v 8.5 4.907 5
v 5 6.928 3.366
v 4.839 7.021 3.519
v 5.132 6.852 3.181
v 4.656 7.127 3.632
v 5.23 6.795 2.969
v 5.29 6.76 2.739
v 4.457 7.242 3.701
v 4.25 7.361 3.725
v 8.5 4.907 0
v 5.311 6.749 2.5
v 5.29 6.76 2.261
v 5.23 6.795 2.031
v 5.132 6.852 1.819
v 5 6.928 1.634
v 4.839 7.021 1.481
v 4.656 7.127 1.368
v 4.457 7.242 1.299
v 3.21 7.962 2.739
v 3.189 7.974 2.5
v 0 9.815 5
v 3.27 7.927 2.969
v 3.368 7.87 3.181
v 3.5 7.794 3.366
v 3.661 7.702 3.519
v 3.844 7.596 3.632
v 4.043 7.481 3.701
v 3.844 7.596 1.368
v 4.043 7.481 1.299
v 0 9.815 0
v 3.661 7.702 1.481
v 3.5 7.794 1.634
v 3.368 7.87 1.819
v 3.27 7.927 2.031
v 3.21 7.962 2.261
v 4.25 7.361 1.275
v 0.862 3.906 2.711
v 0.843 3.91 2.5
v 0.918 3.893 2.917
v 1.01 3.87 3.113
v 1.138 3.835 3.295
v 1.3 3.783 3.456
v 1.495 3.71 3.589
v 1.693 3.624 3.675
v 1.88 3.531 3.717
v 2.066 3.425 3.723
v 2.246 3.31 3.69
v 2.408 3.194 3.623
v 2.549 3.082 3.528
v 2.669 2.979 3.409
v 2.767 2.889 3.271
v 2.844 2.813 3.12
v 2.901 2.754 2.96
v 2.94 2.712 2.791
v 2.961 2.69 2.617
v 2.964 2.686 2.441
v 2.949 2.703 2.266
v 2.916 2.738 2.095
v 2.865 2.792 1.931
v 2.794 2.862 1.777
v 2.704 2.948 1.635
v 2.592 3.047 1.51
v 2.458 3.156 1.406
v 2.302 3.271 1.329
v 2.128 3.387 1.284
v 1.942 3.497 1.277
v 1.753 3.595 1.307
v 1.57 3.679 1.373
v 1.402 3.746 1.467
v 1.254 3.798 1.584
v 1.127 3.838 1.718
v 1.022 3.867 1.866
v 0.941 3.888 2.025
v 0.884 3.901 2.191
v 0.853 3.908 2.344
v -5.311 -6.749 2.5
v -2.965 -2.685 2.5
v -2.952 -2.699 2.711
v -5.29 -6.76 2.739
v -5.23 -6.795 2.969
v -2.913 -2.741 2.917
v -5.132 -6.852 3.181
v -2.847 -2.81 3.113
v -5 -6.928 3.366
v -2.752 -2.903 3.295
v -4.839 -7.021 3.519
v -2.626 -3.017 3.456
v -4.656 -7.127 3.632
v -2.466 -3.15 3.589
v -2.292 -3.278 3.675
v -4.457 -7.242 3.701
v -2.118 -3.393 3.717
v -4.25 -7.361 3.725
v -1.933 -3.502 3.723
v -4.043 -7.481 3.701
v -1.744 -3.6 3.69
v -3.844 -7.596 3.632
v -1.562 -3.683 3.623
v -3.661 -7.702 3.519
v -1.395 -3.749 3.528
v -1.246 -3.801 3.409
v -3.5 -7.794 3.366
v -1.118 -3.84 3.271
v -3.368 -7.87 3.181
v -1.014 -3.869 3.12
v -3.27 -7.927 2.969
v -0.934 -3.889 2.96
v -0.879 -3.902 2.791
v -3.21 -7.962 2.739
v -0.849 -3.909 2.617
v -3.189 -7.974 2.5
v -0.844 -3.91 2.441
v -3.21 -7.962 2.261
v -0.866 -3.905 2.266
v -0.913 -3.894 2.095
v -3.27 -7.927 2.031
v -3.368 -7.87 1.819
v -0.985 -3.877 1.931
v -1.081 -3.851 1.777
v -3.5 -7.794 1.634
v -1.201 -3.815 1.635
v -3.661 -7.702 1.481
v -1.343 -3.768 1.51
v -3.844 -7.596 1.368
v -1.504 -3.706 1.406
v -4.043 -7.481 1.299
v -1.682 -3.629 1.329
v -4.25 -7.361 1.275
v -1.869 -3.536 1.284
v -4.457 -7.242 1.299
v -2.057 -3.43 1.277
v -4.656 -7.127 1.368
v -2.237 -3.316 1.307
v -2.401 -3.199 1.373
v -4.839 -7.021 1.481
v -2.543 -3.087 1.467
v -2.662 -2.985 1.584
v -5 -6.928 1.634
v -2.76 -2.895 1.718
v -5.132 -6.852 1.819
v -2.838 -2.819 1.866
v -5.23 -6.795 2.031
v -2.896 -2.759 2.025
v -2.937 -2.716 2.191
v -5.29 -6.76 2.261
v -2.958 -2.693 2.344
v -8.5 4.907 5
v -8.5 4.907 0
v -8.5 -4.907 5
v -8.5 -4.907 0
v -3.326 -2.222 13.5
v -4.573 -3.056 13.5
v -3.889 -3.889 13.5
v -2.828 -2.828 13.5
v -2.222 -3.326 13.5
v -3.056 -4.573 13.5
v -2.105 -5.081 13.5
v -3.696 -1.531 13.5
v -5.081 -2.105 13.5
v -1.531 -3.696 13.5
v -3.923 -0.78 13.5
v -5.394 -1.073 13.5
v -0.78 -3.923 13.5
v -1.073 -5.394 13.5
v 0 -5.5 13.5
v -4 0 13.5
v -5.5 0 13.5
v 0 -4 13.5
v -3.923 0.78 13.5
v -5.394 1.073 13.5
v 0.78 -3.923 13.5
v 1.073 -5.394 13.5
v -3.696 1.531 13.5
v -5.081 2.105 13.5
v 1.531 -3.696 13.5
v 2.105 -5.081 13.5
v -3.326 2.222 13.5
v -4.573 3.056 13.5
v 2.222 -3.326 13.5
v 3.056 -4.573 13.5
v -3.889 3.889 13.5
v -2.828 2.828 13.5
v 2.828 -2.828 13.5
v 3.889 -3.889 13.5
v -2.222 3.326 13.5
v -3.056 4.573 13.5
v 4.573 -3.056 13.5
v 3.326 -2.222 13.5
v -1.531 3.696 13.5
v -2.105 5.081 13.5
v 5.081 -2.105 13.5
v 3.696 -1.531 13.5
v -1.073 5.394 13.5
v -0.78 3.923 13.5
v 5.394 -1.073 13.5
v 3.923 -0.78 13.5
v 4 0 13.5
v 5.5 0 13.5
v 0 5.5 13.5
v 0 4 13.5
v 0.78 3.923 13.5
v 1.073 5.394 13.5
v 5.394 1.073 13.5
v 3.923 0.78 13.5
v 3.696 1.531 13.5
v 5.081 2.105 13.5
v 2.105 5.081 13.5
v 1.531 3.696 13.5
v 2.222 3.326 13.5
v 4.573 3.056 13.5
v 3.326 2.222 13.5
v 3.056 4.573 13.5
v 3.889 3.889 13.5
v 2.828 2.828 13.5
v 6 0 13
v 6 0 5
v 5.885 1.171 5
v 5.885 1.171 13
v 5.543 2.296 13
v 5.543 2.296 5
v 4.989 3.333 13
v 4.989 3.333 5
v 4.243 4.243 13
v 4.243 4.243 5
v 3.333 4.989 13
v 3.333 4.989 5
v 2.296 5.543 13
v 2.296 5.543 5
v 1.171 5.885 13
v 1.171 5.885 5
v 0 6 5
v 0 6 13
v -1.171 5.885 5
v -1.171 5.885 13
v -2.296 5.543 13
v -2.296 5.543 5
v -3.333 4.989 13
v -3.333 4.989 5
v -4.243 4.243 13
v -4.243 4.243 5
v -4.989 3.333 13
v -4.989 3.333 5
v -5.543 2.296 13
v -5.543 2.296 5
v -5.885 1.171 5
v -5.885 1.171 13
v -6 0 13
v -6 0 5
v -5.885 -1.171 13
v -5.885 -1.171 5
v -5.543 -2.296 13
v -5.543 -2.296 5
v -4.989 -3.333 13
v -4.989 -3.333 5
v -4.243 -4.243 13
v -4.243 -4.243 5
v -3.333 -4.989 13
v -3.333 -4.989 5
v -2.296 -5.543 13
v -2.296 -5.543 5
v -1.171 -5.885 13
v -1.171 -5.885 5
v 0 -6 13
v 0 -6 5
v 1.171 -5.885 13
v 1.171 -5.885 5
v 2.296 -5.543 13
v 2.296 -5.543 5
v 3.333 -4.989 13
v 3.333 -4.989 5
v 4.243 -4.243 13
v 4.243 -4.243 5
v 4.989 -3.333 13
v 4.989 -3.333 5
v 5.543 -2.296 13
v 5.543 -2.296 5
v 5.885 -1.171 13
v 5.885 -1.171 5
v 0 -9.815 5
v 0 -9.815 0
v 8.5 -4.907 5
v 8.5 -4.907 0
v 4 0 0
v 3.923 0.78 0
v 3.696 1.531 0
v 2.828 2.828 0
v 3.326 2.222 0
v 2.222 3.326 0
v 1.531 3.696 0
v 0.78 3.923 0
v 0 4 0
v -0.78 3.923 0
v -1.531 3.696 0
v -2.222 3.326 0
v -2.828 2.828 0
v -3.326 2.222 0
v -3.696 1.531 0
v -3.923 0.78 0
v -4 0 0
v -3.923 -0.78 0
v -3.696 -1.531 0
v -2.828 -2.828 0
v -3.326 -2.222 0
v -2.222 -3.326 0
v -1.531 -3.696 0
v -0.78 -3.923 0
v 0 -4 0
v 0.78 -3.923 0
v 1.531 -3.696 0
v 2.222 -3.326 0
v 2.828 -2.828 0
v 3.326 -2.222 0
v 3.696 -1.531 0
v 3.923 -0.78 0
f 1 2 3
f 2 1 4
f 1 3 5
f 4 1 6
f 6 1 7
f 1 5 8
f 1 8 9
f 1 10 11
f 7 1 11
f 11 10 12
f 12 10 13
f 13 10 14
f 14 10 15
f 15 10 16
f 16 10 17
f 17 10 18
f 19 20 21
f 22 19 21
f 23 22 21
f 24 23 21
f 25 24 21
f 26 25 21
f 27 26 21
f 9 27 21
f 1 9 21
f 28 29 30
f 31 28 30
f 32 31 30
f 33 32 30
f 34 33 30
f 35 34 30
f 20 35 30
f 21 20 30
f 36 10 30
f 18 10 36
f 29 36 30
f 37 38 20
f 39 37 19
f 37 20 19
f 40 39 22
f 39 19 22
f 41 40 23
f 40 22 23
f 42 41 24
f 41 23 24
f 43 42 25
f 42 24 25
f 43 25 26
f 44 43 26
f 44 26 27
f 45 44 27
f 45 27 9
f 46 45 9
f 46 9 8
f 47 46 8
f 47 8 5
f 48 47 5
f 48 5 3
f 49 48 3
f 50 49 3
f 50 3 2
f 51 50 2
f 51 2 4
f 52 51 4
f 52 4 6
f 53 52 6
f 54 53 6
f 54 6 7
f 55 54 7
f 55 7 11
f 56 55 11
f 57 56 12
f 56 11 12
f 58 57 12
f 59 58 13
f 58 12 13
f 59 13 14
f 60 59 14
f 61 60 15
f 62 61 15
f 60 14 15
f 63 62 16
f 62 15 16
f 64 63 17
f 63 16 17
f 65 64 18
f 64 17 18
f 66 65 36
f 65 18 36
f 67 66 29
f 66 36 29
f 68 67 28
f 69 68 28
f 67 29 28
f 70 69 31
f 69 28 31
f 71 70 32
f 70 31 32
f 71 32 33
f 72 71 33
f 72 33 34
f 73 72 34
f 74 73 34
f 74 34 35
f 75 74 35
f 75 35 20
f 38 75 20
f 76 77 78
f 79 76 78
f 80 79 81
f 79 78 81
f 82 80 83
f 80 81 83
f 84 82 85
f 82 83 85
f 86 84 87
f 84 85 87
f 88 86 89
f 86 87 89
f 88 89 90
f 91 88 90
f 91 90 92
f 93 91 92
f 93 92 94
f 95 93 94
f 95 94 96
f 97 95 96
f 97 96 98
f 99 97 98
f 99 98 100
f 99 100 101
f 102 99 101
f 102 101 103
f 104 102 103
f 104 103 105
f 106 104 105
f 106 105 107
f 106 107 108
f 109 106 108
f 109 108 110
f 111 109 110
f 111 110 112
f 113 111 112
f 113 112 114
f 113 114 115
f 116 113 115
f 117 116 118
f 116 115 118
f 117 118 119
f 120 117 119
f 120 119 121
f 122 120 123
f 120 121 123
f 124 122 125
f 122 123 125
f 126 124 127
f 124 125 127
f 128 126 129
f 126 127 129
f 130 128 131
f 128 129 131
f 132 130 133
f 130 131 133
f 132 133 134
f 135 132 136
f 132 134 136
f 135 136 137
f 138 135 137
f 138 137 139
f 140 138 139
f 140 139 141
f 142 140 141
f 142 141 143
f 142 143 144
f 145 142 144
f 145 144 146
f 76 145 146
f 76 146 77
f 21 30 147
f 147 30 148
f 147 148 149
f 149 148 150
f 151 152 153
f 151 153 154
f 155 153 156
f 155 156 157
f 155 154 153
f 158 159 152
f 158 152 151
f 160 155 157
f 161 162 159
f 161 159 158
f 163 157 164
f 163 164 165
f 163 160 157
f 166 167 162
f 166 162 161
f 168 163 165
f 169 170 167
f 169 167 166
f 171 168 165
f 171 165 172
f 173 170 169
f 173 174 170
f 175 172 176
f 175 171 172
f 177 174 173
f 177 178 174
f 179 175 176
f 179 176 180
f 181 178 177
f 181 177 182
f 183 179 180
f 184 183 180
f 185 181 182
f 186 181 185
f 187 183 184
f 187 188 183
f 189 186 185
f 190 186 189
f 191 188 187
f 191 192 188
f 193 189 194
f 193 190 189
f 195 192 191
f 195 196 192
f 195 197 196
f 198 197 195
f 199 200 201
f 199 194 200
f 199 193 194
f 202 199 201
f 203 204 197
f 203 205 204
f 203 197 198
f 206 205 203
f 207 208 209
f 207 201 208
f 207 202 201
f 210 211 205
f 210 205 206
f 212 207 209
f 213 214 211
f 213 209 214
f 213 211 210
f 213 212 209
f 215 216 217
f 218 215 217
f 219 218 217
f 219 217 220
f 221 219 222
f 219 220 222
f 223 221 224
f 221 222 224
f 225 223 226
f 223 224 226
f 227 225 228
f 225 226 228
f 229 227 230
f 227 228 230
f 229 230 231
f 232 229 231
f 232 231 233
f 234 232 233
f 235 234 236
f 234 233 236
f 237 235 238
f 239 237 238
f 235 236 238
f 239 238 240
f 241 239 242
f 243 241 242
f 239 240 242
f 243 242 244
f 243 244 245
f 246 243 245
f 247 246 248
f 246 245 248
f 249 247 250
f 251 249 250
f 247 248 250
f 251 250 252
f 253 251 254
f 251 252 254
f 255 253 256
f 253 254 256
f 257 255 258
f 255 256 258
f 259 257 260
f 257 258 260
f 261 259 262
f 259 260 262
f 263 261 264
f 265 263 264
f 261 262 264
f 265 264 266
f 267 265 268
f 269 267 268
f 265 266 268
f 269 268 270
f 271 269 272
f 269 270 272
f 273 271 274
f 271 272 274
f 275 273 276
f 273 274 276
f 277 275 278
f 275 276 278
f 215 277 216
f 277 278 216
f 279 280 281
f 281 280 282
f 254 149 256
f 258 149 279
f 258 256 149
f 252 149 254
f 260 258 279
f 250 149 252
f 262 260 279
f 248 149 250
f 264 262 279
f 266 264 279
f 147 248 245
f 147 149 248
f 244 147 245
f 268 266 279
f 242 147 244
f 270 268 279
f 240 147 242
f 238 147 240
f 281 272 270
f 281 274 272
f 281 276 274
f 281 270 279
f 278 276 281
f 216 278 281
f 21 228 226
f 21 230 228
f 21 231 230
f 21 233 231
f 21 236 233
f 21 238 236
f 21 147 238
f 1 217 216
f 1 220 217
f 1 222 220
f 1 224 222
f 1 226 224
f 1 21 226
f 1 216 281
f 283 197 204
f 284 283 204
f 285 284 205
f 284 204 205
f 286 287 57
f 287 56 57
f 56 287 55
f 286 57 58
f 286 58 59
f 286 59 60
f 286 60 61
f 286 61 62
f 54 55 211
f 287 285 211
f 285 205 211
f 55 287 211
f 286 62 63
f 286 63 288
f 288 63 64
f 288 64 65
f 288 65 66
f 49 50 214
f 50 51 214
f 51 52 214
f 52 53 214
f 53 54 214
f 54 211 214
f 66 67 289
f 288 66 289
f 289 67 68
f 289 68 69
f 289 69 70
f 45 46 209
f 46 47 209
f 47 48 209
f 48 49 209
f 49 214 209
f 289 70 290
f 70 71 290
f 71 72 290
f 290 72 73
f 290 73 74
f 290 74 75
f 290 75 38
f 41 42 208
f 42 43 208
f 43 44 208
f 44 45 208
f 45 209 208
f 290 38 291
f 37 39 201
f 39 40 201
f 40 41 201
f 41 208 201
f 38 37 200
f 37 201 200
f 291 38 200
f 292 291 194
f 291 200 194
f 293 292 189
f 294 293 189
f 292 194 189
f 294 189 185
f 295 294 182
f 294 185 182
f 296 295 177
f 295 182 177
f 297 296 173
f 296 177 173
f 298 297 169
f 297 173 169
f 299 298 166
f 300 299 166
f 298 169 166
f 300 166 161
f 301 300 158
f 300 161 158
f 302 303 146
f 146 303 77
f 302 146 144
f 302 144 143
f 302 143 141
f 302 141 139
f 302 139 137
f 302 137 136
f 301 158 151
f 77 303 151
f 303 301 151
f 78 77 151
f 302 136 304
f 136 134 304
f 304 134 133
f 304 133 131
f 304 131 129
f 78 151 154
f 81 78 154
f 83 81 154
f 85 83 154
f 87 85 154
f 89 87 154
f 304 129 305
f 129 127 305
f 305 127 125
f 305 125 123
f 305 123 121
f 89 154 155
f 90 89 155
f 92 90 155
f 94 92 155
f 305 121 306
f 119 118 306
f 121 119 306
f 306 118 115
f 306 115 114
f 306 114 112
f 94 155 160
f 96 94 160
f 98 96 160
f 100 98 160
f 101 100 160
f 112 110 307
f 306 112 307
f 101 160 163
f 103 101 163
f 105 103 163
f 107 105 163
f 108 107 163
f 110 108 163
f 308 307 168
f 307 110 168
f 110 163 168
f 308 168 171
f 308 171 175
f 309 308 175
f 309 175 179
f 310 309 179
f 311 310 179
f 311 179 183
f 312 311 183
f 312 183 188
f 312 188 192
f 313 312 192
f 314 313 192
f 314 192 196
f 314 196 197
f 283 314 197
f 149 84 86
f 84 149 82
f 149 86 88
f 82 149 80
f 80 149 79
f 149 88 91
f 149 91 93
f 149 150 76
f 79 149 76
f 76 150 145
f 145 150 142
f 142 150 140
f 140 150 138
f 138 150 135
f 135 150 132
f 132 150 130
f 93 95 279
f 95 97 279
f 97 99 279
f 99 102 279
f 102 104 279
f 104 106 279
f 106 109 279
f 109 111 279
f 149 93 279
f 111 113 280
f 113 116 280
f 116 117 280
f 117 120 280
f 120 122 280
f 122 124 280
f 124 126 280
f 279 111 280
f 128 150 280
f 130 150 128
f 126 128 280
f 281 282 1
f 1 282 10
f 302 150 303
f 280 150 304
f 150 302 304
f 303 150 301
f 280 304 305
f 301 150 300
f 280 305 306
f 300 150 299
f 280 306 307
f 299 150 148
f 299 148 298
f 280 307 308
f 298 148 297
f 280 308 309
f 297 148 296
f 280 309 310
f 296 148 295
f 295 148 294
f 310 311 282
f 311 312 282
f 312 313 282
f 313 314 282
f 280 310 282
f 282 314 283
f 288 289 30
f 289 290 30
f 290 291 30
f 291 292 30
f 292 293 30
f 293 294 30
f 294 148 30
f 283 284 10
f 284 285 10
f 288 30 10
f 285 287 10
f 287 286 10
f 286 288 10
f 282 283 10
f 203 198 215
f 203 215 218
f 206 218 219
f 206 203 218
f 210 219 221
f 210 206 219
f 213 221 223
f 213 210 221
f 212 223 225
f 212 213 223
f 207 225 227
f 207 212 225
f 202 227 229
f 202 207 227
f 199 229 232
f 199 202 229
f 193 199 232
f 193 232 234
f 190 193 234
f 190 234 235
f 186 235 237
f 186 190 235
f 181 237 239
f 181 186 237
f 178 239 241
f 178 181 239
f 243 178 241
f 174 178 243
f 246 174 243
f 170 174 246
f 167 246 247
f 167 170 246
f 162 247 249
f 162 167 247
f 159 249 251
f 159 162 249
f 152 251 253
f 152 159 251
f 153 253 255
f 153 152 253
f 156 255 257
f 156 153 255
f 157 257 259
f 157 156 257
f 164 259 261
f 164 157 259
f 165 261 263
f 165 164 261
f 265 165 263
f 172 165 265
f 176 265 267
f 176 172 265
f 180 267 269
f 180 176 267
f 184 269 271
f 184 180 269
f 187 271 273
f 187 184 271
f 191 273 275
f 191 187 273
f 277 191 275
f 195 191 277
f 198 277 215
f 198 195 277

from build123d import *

# Parameters (mm, degrees)
SALIENTE_EXTRUIR1_DEPTH = 5
CROQUIS2_R              = 6
SALIENTE_EXTRUIR2_DEPTH = 8.5
CROQUIS3_R              = 4
CORTAR_EXTRUIR1_DEPTH   = 19.730545463
CHAFL_N1_SIZE           = 0.5
CROQUIS4_R              = 1.225
CORTAR_EXTRUIR2_DEPTH   = 26.294927028


with BuildPart() as part:
    # Croquis1 → Saliente-Extruir1 (new body)
    with BuildSketch(Plane.XY):
        Polygon((0, 9.814954576), (-8.5, 4.907477288), (-8.5, -4.907477288), (0, -9.814954576), (8.5, -4.907477288), (8.5, 4.907477288), align=None)
    extrude(amount=SALIENTE_EXTRUIR1_DEPTH)

    # Croquis2 → Saliente-Extruir2 (add)
    with BuildSketch(Plane.XY.offset(5)):
        Circle(CROQUIS2_R)
    extrude(amount=SALIENTE_EXTRUIR2_DEPTH)

    # Croquis3 → Cortar-Extruir1 (cut, through all)
    with BuildSketch(Plane.XY.offset(13.5)):
        Circle(CROQUIS3_R)
    extrude(amount=-CORTAR_EXTRUIR1_DEPTH, mode=Mode.SUBTRACT)

    # Chaflán1
    chafl_n1_edges = [part.edges().sort_by_distance(p)[0] for p in [
        (-6, 0, 13.5),
    ]]
    chamfer(chafl_n1_edges, length=CHAFL_N1_SIZE)

    # Croquis4 → Cortar-Extruir2 (cut, through all)
    with BuildSketch(Plane(origin=(4.25, 7.361215932, 0), x_dir=(0.8660254037844415, -0.4999999999999951, 0), z_dir=(0.49999999999999517, 0.8660254037844416, 0))):
        with Locations(Location((0, -2.5, 0), (0, 0, 180))):
            Circle(CROQUIS4_R)
    extrude(amount=-CORTAR_EXTRUIR2_DEPTH, mode=Mode.SUBTRACT)


solid = part.part
